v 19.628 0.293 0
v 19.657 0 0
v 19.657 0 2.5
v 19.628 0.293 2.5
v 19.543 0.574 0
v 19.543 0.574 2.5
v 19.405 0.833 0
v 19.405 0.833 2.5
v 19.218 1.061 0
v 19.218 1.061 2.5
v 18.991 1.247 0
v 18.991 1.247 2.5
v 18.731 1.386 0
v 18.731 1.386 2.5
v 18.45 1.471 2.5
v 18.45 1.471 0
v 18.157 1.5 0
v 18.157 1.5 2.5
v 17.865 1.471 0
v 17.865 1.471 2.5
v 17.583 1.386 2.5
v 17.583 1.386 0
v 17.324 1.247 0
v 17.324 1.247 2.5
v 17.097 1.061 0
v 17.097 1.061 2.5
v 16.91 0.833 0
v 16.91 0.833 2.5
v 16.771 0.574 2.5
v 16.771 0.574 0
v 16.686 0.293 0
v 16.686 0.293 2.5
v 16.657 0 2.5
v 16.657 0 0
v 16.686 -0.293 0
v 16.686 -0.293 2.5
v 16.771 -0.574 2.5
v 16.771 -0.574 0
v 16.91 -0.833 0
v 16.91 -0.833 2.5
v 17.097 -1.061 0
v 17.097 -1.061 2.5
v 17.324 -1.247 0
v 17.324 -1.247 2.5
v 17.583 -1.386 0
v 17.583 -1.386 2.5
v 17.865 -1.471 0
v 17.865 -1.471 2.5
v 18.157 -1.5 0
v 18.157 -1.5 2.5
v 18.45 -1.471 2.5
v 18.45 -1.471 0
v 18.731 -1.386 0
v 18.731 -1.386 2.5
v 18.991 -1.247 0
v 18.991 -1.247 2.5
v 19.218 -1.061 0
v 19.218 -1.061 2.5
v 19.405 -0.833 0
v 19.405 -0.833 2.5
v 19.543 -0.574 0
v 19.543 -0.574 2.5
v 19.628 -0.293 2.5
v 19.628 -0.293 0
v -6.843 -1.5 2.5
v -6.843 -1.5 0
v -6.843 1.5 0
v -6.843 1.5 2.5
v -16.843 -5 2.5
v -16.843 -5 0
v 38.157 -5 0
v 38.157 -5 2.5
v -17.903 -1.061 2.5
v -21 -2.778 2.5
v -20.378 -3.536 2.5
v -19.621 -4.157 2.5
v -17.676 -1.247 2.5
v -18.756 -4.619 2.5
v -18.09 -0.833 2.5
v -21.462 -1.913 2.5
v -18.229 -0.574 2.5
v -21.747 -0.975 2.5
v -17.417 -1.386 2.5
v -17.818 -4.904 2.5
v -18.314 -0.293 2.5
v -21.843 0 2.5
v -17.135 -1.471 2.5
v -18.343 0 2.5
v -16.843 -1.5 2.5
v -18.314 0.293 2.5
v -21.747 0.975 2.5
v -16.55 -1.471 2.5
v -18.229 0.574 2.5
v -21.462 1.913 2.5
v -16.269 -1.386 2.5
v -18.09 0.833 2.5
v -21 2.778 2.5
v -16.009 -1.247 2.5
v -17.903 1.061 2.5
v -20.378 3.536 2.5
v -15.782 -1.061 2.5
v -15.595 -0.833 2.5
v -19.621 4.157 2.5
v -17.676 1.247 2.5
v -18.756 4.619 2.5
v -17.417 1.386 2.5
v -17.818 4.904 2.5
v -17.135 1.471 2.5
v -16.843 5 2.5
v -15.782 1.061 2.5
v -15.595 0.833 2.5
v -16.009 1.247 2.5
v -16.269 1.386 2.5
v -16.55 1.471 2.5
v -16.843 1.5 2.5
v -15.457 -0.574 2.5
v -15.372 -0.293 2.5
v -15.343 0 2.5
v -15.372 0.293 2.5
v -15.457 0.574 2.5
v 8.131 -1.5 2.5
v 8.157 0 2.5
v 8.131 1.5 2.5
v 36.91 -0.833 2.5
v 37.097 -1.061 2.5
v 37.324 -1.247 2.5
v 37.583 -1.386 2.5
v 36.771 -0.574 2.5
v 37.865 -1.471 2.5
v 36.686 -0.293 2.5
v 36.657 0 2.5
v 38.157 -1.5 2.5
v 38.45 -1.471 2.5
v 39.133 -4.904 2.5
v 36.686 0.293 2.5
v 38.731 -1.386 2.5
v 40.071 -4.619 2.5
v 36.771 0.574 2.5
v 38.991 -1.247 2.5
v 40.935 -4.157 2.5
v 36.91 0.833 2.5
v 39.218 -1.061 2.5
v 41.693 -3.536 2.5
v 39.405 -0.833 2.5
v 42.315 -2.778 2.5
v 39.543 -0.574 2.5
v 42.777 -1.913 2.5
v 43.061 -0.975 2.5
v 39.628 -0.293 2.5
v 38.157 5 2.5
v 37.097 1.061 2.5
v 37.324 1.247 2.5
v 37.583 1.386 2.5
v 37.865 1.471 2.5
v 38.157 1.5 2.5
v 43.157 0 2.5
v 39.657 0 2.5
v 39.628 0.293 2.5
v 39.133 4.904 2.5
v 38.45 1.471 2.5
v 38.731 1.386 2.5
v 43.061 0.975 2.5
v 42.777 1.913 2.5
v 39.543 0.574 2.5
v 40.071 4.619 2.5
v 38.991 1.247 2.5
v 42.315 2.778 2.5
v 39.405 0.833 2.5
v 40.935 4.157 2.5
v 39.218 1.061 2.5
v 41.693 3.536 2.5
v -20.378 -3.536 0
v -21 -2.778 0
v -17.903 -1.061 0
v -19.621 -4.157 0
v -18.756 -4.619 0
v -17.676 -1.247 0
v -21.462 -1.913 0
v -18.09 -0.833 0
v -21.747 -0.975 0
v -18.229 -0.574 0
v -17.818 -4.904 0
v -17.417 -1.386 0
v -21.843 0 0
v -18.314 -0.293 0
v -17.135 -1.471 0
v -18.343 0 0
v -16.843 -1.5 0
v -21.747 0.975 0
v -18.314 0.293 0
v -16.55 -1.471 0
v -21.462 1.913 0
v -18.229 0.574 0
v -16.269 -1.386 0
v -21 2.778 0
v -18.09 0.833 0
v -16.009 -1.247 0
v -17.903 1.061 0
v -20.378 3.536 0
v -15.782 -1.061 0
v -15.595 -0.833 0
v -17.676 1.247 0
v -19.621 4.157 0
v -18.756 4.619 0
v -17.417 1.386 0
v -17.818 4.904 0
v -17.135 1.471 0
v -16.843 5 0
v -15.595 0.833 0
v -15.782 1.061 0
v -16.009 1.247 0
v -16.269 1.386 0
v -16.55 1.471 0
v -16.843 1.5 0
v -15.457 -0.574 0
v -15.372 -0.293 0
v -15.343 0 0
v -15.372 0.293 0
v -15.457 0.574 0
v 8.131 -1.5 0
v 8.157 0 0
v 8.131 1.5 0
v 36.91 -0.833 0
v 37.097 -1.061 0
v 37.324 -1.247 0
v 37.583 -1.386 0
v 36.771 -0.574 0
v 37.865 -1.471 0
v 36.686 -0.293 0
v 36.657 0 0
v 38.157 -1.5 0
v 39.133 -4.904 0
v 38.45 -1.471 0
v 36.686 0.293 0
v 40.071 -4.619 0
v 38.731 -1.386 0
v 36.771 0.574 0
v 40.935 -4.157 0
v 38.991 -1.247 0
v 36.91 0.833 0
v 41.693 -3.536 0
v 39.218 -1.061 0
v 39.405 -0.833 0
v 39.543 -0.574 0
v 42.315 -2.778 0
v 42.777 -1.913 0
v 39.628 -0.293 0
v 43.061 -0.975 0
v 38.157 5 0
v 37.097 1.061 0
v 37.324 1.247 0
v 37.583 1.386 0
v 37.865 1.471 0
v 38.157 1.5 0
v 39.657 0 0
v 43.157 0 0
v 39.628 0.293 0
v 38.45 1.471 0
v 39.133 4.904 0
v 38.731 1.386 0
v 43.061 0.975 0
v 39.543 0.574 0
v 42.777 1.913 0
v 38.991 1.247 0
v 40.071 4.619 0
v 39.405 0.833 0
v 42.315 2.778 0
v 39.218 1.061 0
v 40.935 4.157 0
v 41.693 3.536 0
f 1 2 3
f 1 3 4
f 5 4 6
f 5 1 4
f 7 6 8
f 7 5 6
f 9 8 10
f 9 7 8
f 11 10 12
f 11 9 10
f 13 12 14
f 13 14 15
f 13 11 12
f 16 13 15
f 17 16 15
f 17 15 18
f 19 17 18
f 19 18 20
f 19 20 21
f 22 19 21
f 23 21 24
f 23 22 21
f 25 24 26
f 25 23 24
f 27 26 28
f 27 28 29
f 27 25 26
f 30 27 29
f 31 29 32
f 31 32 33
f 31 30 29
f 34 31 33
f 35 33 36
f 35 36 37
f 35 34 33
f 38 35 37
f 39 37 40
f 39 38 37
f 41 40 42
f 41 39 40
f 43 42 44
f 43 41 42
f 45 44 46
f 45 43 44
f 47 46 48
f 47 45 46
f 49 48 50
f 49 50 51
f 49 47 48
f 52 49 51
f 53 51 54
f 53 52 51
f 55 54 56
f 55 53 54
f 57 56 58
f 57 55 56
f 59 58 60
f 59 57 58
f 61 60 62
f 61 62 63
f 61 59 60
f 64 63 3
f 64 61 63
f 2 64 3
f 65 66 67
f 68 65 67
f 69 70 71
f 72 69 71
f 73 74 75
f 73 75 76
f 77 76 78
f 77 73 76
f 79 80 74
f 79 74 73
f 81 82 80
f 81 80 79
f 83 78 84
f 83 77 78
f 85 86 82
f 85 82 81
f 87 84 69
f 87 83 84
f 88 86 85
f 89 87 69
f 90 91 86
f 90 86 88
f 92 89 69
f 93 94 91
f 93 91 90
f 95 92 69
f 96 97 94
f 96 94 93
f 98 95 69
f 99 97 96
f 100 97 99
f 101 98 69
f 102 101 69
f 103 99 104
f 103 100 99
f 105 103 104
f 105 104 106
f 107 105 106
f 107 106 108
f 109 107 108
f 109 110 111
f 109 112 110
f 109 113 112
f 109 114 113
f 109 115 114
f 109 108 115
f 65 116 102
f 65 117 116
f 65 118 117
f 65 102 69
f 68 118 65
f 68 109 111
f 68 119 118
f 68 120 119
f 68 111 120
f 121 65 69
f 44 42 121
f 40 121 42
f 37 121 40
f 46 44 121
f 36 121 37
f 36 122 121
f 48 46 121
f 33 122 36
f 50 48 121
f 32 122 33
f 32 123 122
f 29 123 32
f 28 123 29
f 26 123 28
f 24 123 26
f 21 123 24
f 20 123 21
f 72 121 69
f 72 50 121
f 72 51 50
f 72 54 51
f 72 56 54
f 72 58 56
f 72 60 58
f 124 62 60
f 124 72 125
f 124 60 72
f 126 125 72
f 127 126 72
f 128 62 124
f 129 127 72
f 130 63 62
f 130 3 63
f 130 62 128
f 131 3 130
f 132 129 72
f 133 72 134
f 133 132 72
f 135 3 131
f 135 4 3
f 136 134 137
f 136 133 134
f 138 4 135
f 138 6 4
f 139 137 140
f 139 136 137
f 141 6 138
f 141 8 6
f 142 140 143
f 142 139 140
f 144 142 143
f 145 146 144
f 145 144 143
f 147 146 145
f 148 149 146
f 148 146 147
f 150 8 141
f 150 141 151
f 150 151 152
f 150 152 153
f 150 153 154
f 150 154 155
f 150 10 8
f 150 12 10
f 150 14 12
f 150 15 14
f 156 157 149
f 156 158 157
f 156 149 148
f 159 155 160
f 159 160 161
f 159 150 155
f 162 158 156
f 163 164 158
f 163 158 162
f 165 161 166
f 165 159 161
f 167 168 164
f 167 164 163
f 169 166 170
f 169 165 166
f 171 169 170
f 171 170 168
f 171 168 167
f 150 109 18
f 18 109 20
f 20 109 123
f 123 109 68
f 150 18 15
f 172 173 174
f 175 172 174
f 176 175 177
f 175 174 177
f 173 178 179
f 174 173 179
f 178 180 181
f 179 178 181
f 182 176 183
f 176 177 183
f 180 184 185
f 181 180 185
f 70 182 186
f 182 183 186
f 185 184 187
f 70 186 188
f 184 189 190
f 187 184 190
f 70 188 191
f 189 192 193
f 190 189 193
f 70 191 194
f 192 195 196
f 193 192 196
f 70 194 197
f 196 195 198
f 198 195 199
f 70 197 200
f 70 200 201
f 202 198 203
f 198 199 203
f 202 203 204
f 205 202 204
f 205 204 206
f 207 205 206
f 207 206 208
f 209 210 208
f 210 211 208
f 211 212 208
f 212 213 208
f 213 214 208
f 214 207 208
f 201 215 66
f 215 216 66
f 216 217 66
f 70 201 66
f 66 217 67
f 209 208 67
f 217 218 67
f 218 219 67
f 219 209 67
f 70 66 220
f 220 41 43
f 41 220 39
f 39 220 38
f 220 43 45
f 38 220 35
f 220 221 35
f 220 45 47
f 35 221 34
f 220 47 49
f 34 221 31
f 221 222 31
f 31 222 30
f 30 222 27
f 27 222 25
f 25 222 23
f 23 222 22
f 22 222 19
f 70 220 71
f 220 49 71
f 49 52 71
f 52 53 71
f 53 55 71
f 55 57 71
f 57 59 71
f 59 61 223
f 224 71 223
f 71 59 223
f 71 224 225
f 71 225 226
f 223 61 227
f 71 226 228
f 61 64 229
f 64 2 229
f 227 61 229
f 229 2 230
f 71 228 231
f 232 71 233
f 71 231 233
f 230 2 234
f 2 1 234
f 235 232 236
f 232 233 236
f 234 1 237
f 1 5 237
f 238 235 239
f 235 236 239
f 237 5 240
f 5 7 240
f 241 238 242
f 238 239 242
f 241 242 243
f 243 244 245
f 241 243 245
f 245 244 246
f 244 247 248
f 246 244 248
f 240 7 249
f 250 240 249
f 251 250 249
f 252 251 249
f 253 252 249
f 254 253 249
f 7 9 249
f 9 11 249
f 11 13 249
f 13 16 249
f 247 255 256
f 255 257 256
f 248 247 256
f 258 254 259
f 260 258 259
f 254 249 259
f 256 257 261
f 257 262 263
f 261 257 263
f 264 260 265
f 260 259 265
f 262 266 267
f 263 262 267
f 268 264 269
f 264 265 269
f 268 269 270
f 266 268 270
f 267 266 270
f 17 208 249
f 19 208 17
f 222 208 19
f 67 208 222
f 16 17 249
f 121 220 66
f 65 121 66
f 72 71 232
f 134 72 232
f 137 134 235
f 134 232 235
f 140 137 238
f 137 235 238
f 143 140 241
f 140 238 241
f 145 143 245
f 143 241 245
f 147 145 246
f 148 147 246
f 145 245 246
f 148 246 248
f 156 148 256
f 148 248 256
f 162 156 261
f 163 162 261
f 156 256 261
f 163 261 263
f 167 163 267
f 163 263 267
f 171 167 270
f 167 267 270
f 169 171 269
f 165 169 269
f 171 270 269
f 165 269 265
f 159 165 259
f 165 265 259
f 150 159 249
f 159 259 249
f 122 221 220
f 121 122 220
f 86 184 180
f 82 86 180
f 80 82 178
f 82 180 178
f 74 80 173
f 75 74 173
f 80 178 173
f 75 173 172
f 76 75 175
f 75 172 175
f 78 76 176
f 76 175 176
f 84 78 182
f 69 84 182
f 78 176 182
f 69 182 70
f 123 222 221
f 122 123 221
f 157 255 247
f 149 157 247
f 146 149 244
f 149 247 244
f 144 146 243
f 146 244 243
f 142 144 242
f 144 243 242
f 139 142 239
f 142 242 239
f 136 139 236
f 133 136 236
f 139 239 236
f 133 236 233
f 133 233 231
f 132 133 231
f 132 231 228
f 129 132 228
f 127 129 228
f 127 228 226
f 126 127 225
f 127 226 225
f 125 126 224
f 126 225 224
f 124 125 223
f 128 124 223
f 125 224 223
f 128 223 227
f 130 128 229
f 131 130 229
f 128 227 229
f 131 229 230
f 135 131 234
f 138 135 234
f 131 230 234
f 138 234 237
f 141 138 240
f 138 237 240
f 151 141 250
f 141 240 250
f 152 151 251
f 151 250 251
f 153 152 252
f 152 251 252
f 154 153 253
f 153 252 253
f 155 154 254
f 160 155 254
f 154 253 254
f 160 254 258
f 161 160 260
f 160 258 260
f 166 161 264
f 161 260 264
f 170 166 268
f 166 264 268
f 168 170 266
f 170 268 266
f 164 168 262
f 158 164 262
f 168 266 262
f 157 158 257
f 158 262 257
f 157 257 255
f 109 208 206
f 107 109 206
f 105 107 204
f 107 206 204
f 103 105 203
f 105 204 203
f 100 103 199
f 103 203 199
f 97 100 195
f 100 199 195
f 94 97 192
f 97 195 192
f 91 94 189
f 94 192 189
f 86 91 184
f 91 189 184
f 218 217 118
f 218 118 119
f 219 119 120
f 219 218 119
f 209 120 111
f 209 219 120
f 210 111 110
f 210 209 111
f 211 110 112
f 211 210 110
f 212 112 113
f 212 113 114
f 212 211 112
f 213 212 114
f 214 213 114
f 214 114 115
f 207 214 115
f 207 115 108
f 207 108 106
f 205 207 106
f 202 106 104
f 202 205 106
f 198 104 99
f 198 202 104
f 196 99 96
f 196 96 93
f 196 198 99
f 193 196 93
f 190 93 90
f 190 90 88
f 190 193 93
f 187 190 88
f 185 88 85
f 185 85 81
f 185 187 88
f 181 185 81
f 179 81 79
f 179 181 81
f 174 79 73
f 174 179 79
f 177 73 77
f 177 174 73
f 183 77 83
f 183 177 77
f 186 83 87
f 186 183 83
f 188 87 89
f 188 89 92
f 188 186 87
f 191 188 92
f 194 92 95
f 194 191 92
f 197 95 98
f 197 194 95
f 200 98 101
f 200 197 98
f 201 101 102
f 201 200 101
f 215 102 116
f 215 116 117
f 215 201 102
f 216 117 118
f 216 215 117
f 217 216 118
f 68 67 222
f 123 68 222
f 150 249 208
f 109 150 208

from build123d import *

# Parameters (mm, degrees)
F0_R     = 1.5
F1_DEPTH = 2.5


with BuildPart() as f1:
    # F0 (on Top) → F1 (new body)
    with BuildSketch(Plane.XY):
        with BuildLine():
            Line((-16.842703, -5), (38.157297, -5))
            ThreePointArc((38.157297, -5), (43.157297, 0), (38.157297, 5))
            Line((38.157297, 5), (-16.842703, 5))
            ThreePointArc((-16.842703, 5), (-20.378237, 3.535534), (-21.842703, 0))
            ThreePointArc((-21.842703, 0), (-20.378237, -3.535534), (-16.842703, -5))
        make_face()
        with Locations((-16.842703, 0)):
            Circle(F0_R, mode=Mode.SUBTRACT)
        Polygon((-6.842703, -1.499771), (-6.842703, 0), (-6.842703, 1.499771), (8.131084, 1.499771), (8.157297, 0), (8.131084, -1.499771), align=None, mode=Mode.SUBTRACT)
        with Locations((18.157297, 0)):
            Circle(F0_R, mode=Mode.SUBTRACT)
        with BuildLine():
            ThreePointArc((36.657297, 0), (38.157297, 1.5), (39.657297, 0))
            ThreePointArc((39.657297, 0), (38.157297, -1.5), (36.657297, 0))
        make_face(mode=Mode.SUBTRACT)
    extrude(amount=F1_DEPTH)


solid = f1.part
